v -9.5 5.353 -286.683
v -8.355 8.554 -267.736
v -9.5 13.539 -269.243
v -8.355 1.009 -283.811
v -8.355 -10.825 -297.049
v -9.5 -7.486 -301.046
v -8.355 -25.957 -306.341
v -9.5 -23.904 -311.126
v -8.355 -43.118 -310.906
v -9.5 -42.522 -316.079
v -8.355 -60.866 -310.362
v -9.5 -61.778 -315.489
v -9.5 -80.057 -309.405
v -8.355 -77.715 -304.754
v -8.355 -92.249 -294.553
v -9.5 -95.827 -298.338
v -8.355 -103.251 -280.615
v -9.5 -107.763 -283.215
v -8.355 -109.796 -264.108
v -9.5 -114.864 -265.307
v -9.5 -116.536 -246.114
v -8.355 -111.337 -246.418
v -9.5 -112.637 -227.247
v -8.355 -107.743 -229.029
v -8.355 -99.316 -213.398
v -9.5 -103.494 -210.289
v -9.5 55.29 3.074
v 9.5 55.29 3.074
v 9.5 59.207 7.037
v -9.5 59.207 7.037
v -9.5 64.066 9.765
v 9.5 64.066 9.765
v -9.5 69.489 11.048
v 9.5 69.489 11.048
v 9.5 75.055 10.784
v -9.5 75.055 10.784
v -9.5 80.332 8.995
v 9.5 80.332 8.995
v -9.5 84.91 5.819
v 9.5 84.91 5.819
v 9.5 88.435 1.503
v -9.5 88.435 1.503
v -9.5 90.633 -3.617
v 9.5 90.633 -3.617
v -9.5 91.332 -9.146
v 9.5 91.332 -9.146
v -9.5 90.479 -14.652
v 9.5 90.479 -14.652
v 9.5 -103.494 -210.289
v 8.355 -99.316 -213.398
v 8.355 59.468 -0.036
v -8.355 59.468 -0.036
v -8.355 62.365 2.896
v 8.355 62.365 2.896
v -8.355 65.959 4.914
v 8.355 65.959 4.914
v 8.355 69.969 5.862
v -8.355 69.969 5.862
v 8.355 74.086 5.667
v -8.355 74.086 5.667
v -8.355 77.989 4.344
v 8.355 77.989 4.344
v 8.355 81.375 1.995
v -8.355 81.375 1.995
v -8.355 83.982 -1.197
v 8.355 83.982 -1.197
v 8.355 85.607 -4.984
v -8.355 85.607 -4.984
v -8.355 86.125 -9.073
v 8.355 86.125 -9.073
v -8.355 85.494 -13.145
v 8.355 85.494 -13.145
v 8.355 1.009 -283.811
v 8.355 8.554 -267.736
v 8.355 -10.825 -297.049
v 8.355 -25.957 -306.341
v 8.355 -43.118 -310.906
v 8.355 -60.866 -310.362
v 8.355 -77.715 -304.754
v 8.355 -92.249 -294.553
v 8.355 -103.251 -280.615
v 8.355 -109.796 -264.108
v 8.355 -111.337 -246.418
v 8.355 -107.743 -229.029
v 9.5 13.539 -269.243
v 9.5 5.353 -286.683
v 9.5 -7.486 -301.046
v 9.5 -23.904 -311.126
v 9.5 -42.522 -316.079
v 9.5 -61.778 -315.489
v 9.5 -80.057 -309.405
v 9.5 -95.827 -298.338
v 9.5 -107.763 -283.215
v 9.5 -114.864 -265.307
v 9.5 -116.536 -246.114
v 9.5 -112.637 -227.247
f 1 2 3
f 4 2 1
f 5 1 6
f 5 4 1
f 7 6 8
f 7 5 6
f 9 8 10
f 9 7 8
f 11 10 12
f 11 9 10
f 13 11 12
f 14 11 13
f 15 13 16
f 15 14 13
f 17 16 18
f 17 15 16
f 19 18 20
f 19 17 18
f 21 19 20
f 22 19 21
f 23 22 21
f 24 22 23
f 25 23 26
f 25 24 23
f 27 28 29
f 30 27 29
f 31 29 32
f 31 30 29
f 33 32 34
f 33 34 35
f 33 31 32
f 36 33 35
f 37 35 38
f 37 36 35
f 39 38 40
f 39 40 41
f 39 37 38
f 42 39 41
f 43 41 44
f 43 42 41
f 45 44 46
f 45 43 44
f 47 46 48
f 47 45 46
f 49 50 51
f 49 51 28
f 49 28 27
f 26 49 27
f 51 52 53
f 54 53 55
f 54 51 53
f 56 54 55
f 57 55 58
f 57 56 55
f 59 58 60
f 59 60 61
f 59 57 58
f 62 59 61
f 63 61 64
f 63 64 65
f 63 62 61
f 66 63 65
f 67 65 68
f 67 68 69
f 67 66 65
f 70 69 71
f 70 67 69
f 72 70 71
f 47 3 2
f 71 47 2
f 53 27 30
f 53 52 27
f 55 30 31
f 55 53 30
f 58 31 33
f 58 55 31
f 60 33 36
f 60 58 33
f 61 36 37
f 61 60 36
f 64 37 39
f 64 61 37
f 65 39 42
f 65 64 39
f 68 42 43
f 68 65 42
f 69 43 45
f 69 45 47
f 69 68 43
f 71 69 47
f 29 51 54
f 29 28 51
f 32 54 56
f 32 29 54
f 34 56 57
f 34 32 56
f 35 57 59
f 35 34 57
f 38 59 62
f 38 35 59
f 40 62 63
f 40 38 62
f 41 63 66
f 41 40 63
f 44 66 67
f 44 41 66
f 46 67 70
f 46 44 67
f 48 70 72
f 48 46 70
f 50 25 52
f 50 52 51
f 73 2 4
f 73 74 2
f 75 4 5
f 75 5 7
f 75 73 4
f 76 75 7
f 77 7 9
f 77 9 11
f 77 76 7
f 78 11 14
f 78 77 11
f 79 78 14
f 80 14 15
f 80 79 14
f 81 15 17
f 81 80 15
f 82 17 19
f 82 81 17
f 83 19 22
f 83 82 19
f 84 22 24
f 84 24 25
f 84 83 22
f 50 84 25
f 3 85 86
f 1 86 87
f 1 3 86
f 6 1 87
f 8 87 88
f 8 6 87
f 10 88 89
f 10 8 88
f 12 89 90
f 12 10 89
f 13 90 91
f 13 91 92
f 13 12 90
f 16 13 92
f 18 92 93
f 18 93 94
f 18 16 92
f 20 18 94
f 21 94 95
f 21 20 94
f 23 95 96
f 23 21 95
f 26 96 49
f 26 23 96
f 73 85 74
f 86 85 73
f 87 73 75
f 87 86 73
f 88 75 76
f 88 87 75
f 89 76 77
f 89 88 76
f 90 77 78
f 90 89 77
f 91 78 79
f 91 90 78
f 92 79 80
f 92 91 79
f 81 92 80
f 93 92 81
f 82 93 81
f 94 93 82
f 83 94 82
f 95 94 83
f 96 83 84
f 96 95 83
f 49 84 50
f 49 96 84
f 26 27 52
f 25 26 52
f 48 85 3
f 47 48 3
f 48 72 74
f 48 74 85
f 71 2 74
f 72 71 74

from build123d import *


with BuildPart() as part:
    # Sweep2: sweep along a path in Schizzo2
    with BuildLine(Plane(origin=(0, 0, 0), x_dir=(0, 0, -1), z_dir=(1, 0, 0))) as sweep2_path:
        Line((13.145484476, 85.493570144), (267.7362051, 8.553542371))
        ThreePointArc((267.7362051, 8.553542371), (304.754104599, -77.714587953), (213.39832656, -99.316370558))
        Line((213.39832656, -99.316370558), (0.035611501, 59.468246845))
        ThreePointArc((0.035611501, 59.468246845), (-4.343739367, 77.988894569), (13.145484476, 85.493570144))
    # Schizzo3D1 → Sweep2 (sweep)
    with BuildSketch(Plane(origin=(9.500289888, 88.002440666, -22.845650773), x_dir=(-1, 0, 0), z_dir=(0, 0.28929028421703545, 0.9572414175419004))):
        Polygon((0, 0), (19, 0), (17.855289888, 5.20775864), (1.145289888, 5.20775864), align=None)
    sweep(path=sweep2_path.line)


solid = part.part
